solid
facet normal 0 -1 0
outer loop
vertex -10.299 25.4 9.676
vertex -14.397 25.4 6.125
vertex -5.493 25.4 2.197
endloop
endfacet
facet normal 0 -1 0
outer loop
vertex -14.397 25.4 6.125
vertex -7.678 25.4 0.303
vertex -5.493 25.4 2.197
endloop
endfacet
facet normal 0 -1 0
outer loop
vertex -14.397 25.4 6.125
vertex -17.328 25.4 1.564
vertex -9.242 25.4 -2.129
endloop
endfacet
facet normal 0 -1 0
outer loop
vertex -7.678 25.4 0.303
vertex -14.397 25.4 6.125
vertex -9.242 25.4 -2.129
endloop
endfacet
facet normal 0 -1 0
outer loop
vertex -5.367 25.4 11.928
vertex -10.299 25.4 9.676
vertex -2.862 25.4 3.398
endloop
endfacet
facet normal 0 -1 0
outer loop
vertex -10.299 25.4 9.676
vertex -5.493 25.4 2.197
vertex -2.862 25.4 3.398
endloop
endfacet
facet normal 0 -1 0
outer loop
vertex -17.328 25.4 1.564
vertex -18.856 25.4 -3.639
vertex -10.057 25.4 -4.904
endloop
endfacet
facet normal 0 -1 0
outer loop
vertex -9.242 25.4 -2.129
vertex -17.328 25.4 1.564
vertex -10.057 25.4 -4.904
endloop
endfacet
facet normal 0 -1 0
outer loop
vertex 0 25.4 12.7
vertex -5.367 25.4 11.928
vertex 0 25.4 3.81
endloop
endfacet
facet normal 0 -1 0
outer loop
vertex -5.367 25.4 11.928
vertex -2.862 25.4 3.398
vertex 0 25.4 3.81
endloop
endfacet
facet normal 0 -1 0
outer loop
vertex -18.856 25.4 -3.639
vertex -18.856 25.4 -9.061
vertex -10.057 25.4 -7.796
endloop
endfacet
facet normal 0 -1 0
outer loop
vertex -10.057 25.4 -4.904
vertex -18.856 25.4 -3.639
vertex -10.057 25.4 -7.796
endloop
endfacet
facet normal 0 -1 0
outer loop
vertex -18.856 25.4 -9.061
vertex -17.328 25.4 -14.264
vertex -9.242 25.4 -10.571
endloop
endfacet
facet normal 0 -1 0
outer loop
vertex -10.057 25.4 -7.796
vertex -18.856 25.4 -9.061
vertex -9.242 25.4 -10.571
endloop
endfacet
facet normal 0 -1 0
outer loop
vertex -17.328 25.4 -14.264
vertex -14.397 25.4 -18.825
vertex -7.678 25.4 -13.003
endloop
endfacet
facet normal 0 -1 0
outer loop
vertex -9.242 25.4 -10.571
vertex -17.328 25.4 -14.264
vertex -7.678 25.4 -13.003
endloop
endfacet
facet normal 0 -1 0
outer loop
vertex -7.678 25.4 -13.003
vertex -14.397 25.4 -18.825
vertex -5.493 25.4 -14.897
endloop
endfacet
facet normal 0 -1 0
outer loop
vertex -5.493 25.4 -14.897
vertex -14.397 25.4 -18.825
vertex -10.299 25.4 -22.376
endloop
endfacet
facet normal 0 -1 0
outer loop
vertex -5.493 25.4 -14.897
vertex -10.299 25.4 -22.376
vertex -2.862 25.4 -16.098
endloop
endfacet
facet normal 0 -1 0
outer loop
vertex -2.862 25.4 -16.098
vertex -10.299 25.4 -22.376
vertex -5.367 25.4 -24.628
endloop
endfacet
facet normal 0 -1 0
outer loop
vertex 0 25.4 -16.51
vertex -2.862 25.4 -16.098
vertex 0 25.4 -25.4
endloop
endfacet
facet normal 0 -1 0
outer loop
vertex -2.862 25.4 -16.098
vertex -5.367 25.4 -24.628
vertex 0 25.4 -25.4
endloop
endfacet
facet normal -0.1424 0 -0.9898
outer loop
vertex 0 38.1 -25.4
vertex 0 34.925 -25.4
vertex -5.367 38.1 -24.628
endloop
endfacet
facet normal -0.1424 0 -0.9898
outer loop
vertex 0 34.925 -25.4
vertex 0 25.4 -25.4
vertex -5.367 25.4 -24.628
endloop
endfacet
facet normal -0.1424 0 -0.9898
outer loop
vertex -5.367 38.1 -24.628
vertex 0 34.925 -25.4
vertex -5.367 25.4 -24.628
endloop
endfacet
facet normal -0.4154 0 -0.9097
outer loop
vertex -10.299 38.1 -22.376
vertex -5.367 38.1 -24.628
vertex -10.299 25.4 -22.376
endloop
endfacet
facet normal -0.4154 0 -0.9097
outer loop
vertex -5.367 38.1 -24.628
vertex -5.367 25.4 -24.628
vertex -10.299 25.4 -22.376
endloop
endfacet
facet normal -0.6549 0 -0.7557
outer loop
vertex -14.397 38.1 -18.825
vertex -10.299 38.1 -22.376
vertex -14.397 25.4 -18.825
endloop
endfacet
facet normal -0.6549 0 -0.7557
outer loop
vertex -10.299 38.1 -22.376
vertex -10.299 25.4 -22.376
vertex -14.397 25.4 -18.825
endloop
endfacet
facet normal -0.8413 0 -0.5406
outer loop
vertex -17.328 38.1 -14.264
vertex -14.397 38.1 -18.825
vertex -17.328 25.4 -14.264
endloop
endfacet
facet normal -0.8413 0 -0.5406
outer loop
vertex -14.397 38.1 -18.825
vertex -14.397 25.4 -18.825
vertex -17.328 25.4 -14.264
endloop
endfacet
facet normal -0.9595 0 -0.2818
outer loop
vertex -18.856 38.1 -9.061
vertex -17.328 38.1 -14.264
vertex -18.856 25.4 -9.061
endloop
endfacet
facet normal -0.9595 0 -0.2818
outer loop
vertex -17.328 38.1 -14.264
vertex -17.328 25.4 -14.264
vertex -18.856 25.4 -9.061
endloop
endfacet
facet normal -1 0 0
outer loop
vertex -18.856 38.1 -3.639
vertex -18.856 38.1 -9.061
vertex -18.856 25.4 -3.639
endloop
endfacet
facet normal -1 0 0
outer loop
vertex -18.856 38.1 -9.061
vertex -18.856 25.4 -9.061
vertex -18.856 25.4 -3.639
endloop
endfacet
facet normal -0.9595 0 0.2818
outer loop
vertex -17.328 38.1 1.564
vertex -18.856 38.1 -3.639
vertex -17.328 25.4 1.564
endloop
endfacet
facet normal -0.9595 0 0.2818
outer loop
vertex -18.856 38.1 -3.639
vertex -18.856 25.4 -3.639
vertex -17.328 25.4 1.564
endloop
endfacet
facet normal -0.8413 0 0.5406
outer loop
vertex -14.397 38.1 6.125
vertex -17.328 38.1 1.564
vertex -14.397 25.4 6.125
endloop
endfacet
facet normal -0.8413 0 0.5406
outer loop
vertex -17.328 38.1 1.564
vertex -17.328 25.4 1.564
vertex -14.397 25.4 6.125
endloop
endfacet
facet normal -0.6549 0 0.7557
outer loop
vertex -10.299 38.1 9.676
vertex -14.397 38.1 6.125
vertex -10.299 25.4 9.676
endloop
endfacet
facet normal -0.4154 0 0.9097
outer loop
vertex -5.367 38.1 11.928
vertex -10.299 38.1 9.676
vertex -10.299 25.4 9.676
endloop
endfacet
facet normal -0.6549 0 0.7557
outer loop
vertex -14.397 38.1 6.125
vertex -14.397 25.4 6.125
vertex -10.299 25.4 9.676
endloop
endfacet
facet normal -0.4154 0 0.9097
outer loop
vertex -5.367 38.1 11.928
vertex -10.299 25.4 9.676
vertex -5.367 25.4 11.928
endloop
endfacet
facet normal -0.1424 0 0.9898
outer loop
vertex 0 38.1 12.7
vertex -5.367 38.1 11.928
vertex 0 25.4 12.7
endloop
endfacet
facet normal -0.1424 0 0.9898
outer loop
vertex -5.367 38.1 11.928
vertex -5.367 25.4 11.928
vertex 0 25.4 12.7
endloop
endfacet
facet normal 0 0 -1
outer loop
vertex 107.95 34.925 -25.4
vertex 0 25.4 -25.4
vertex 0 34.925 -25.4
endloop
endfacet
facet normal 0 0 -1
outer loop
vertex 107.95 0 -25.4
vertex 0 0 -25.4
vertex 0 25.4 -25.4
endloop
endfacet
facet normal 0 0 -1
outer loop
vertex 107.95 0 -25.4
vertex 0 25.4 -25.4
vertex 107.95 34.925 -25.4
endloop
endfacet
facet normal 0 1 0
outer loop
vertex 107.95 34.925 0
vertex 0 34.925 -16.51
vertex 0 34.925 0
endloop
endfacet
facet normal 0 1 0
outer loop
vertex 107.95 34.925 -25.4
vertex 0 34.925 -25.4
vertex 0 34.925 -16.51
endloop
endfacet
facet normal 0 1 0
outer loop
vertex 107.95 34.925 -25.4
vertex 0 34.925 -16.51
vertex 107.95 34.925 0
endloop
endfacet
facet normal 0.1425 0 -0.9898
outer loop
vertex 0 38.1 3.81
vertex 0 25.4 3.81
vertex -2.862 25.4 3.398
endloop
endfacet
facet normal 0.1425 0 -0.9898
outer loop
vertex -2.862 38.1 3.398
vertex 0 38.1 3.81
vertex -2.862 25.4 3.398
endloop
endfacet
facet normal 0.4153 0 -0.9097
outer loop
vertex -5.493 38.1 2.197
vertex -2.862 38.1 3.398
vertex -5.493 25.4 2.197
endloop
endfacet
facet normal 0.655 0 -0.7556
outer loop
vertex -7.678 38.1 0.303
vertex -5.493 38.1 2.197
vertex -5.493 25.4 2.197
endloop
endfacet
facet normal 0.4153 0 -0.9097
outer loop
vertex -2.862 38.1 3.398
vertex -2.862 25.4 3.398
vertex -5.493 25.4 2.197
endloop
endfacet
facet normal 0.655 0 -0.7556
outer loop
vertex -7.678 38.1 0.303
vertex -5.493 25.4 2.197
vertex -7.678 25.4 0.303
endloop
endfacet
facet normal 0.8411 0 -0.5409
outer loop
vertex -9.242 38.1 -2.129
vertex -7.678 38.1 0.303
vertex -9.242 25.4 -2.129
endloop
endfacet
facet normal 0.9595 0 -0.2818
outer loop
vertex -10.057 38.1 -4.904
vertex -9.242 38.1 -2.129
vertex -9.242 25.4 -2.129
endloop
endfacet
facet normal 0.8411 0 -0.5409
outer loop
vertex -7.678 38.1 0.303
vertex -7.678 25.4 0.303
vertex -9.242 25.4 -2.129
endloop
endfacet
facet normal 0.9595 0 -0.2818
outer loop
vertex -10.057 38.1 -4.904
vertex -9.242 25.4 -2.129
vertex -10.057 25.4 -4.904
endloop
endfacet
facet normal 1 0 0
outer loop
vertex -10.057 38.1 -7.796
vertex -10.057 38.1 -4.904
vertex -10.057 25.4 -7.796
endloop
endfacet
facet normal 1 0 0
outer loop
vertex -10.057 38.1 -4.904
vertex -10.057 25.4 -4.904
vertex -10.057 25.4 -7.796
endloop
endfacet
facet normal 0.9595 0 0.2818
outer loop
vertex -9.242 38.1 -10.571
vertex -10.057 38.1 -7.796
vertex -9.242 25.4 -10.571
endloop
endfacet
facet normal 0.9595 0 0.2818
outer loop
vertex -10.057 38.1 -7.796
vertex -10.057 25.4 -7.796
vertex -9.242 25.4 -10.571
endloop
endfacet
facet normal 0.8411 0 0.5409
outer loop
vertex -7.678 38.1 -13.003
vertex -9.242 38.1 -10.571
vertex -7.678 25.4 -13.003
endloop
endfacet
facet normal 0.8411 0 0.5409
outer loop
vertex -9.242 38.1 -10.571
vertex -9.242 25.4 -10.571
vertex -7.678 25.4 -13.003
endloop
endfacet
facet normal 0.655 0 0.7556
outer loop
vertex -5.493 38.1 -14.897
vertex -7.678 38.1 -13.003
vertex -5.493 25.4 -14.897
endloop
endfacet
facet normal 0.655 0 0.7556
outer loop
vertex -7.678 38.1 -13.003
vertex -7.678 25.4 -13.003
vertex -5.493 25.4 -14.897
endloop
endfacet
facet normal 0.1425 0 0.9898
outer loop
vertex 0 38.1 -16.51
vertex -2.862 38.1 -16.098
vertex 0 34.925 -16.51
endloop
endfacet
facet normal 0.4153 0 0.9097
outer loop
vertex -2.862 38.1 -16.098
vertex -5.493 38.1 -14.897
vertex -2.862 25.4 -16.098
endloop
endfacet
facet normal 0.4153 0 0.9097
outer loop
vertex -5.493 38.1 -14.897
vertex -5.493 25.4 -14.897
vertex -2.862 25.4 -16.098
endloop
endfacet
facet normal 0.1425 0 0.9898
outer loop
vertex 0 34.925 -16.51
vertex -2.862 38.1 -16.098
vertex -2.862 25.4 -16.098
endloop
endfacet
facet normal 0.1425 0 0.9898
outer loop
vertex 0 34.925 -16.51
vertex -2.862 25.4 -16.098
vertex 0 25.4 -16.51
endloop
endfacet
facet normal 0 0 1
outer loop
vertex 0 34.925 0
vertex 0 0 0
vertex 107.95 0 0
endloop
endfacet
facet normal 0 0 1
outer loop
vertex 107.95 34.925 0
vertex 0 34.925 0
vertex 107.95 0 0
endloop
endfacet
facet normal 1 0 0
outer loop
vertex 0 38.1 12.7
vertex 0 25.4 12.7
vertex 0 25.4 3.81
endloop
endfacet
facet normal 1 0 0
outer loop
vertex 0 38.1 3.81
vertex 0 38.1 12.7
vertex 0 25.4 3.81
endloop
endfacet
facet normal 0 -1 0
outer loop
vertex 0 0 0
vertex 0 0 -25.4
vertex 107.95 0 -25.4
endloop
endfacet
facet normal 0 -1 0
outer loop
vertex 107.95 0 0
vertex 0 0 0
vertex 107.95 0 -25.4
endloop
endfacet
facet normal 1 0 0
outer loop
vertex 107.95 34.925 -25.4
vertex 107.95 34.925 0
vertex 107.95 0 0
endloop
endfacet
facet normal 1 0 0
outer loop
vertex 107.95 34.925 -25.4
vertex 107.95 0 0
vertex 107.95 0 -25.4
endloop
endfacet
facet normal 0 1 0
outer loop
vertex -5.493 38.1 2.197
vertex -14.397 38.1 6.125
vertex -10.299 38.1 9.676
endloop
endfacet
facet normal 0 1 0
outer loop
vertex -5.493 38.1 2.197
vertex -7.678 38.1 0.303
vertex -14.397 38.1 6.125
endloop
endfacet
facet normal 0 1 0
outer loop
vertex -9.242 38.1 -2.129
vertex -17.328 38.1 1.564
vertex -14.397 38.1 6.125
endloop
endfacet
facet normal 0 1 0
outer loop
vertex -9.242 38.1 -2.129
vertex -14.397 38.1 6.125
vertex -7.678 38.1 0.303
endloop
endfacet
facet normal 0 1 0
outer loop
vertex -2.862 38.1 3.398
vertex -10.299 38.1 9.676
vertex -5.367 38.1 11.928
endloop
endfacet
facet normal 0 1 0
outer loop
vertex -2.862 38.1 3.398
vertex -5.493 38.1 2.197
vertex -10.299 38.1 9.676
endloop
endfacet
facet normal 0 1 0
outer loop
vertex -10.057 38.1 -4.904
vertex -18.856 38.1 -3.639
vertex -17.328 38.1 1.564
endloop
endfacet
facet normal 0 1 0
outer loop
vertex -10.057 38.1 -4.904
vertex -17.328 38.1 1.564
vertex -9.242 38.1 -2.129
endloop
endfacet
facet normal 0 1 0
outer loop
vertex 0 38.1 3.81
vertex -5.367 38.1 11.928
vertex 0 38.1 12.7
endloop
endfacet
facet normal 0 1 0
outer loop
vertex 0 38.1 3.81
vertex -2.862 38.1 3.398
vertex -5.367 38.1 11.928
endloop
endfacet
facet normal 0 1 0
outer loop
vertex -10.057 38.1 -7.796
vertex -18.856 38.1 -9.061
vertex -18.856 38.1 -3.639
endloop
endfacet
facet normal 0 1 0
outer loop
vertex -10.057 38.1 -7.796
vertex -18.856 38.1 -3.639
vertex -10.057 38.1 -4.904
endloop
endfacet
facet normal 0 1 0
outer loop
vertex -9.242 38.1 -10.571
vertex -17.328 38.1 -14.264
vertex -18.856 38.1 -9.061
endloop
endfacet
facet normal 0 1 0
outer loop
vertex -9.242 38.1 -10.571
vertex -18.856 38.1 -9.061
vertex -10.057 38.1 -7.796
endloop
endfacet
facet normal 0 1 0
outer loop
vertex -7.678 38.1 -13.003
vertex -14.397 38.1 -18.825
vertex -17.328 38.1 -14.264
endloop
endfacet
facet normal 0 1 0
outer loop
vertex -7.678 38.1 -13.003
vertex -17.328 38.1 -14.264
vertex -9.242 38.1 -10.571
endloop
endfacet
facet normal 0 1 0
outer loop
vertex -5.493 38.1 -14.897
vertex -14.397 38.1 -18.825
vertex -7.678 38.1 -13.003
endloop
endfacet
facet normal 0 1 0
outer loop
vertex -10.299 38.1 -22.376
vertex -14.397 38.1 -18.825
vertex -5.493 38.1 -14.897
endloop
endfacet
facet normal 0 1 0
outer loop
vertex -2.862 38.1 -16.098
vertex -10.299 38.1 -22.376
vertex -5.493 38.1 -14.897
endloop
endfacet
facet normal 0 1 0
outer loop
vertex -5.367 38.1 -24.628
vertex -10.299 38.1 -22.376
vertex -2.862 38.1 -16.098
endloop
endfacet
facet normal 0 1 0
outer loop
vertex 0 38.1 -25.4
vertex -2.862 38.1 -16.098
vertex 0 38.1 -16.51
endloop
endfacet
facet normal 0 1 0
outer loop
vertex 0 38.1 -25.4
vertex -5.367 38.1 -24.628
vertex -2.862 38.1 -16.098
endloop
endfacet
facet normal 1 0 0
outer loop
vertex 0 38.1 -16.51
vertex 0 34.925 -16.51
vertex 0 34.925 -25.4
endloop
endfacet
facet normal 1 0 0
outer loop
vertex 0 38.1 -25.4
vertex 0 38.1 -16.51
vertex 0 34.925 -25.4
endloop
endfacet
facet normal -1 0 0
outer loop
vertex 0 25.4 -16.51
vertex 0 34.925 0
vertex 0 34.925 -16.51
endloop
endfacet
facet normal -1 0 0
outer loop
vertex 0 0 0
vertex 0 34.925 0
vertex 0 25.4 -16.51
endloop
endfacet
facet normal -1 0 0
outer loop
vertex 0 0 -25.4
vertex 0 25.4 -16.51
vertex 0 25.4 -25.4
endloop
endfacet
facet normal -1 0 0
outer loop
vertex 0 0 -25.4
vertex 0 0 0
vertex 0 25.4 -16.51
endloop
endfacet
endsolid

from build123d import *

# Parameters (mm, degrees)
SKETCH1_W           = 107.95
SKETCH1_H           = 25.4
BOSS_EXTRUDE1_DEPTH = 34.925
BOSS_EXTRUDE2_DEPTH = 12.7


with BuildPart() as part:
    # Sketch1 → Boss-Extrude1 (new body)
    with BuildSketch(Plane(origin=(0, 0, 0), x_dir=(1, 0, 0), z_dir=(0, 1, 0))):
        with Locations((53.975, 12.7)):
            Rectangle(SKETCH1_W, SKETCH1_H)
    extrude(amount=BOSS_EXTRUDE1_DEPTH)

    # Sketch2 → Boss-Extrude2 (add)
    with BuildSketch(Plane(origin=(0, 25.4, 0), x_dir=(1, 0, 0), z_dir=(0, 1, 0))):
        with BuildLine():
            Line((0, 16.51), (0, 25.4))
            ThreePointArc((0, 25.4), (-19.05, 6.35), (0, -12.7))
            Line((0, -12.7), (0, -3.81))
            ThreePointArc((0, -3.81), (-10.16, 6.35), (0, 16.51))
        make_face()
    extrude(amount=BOSS_EXTRUDE2_DEPTH)


solid = part.part
